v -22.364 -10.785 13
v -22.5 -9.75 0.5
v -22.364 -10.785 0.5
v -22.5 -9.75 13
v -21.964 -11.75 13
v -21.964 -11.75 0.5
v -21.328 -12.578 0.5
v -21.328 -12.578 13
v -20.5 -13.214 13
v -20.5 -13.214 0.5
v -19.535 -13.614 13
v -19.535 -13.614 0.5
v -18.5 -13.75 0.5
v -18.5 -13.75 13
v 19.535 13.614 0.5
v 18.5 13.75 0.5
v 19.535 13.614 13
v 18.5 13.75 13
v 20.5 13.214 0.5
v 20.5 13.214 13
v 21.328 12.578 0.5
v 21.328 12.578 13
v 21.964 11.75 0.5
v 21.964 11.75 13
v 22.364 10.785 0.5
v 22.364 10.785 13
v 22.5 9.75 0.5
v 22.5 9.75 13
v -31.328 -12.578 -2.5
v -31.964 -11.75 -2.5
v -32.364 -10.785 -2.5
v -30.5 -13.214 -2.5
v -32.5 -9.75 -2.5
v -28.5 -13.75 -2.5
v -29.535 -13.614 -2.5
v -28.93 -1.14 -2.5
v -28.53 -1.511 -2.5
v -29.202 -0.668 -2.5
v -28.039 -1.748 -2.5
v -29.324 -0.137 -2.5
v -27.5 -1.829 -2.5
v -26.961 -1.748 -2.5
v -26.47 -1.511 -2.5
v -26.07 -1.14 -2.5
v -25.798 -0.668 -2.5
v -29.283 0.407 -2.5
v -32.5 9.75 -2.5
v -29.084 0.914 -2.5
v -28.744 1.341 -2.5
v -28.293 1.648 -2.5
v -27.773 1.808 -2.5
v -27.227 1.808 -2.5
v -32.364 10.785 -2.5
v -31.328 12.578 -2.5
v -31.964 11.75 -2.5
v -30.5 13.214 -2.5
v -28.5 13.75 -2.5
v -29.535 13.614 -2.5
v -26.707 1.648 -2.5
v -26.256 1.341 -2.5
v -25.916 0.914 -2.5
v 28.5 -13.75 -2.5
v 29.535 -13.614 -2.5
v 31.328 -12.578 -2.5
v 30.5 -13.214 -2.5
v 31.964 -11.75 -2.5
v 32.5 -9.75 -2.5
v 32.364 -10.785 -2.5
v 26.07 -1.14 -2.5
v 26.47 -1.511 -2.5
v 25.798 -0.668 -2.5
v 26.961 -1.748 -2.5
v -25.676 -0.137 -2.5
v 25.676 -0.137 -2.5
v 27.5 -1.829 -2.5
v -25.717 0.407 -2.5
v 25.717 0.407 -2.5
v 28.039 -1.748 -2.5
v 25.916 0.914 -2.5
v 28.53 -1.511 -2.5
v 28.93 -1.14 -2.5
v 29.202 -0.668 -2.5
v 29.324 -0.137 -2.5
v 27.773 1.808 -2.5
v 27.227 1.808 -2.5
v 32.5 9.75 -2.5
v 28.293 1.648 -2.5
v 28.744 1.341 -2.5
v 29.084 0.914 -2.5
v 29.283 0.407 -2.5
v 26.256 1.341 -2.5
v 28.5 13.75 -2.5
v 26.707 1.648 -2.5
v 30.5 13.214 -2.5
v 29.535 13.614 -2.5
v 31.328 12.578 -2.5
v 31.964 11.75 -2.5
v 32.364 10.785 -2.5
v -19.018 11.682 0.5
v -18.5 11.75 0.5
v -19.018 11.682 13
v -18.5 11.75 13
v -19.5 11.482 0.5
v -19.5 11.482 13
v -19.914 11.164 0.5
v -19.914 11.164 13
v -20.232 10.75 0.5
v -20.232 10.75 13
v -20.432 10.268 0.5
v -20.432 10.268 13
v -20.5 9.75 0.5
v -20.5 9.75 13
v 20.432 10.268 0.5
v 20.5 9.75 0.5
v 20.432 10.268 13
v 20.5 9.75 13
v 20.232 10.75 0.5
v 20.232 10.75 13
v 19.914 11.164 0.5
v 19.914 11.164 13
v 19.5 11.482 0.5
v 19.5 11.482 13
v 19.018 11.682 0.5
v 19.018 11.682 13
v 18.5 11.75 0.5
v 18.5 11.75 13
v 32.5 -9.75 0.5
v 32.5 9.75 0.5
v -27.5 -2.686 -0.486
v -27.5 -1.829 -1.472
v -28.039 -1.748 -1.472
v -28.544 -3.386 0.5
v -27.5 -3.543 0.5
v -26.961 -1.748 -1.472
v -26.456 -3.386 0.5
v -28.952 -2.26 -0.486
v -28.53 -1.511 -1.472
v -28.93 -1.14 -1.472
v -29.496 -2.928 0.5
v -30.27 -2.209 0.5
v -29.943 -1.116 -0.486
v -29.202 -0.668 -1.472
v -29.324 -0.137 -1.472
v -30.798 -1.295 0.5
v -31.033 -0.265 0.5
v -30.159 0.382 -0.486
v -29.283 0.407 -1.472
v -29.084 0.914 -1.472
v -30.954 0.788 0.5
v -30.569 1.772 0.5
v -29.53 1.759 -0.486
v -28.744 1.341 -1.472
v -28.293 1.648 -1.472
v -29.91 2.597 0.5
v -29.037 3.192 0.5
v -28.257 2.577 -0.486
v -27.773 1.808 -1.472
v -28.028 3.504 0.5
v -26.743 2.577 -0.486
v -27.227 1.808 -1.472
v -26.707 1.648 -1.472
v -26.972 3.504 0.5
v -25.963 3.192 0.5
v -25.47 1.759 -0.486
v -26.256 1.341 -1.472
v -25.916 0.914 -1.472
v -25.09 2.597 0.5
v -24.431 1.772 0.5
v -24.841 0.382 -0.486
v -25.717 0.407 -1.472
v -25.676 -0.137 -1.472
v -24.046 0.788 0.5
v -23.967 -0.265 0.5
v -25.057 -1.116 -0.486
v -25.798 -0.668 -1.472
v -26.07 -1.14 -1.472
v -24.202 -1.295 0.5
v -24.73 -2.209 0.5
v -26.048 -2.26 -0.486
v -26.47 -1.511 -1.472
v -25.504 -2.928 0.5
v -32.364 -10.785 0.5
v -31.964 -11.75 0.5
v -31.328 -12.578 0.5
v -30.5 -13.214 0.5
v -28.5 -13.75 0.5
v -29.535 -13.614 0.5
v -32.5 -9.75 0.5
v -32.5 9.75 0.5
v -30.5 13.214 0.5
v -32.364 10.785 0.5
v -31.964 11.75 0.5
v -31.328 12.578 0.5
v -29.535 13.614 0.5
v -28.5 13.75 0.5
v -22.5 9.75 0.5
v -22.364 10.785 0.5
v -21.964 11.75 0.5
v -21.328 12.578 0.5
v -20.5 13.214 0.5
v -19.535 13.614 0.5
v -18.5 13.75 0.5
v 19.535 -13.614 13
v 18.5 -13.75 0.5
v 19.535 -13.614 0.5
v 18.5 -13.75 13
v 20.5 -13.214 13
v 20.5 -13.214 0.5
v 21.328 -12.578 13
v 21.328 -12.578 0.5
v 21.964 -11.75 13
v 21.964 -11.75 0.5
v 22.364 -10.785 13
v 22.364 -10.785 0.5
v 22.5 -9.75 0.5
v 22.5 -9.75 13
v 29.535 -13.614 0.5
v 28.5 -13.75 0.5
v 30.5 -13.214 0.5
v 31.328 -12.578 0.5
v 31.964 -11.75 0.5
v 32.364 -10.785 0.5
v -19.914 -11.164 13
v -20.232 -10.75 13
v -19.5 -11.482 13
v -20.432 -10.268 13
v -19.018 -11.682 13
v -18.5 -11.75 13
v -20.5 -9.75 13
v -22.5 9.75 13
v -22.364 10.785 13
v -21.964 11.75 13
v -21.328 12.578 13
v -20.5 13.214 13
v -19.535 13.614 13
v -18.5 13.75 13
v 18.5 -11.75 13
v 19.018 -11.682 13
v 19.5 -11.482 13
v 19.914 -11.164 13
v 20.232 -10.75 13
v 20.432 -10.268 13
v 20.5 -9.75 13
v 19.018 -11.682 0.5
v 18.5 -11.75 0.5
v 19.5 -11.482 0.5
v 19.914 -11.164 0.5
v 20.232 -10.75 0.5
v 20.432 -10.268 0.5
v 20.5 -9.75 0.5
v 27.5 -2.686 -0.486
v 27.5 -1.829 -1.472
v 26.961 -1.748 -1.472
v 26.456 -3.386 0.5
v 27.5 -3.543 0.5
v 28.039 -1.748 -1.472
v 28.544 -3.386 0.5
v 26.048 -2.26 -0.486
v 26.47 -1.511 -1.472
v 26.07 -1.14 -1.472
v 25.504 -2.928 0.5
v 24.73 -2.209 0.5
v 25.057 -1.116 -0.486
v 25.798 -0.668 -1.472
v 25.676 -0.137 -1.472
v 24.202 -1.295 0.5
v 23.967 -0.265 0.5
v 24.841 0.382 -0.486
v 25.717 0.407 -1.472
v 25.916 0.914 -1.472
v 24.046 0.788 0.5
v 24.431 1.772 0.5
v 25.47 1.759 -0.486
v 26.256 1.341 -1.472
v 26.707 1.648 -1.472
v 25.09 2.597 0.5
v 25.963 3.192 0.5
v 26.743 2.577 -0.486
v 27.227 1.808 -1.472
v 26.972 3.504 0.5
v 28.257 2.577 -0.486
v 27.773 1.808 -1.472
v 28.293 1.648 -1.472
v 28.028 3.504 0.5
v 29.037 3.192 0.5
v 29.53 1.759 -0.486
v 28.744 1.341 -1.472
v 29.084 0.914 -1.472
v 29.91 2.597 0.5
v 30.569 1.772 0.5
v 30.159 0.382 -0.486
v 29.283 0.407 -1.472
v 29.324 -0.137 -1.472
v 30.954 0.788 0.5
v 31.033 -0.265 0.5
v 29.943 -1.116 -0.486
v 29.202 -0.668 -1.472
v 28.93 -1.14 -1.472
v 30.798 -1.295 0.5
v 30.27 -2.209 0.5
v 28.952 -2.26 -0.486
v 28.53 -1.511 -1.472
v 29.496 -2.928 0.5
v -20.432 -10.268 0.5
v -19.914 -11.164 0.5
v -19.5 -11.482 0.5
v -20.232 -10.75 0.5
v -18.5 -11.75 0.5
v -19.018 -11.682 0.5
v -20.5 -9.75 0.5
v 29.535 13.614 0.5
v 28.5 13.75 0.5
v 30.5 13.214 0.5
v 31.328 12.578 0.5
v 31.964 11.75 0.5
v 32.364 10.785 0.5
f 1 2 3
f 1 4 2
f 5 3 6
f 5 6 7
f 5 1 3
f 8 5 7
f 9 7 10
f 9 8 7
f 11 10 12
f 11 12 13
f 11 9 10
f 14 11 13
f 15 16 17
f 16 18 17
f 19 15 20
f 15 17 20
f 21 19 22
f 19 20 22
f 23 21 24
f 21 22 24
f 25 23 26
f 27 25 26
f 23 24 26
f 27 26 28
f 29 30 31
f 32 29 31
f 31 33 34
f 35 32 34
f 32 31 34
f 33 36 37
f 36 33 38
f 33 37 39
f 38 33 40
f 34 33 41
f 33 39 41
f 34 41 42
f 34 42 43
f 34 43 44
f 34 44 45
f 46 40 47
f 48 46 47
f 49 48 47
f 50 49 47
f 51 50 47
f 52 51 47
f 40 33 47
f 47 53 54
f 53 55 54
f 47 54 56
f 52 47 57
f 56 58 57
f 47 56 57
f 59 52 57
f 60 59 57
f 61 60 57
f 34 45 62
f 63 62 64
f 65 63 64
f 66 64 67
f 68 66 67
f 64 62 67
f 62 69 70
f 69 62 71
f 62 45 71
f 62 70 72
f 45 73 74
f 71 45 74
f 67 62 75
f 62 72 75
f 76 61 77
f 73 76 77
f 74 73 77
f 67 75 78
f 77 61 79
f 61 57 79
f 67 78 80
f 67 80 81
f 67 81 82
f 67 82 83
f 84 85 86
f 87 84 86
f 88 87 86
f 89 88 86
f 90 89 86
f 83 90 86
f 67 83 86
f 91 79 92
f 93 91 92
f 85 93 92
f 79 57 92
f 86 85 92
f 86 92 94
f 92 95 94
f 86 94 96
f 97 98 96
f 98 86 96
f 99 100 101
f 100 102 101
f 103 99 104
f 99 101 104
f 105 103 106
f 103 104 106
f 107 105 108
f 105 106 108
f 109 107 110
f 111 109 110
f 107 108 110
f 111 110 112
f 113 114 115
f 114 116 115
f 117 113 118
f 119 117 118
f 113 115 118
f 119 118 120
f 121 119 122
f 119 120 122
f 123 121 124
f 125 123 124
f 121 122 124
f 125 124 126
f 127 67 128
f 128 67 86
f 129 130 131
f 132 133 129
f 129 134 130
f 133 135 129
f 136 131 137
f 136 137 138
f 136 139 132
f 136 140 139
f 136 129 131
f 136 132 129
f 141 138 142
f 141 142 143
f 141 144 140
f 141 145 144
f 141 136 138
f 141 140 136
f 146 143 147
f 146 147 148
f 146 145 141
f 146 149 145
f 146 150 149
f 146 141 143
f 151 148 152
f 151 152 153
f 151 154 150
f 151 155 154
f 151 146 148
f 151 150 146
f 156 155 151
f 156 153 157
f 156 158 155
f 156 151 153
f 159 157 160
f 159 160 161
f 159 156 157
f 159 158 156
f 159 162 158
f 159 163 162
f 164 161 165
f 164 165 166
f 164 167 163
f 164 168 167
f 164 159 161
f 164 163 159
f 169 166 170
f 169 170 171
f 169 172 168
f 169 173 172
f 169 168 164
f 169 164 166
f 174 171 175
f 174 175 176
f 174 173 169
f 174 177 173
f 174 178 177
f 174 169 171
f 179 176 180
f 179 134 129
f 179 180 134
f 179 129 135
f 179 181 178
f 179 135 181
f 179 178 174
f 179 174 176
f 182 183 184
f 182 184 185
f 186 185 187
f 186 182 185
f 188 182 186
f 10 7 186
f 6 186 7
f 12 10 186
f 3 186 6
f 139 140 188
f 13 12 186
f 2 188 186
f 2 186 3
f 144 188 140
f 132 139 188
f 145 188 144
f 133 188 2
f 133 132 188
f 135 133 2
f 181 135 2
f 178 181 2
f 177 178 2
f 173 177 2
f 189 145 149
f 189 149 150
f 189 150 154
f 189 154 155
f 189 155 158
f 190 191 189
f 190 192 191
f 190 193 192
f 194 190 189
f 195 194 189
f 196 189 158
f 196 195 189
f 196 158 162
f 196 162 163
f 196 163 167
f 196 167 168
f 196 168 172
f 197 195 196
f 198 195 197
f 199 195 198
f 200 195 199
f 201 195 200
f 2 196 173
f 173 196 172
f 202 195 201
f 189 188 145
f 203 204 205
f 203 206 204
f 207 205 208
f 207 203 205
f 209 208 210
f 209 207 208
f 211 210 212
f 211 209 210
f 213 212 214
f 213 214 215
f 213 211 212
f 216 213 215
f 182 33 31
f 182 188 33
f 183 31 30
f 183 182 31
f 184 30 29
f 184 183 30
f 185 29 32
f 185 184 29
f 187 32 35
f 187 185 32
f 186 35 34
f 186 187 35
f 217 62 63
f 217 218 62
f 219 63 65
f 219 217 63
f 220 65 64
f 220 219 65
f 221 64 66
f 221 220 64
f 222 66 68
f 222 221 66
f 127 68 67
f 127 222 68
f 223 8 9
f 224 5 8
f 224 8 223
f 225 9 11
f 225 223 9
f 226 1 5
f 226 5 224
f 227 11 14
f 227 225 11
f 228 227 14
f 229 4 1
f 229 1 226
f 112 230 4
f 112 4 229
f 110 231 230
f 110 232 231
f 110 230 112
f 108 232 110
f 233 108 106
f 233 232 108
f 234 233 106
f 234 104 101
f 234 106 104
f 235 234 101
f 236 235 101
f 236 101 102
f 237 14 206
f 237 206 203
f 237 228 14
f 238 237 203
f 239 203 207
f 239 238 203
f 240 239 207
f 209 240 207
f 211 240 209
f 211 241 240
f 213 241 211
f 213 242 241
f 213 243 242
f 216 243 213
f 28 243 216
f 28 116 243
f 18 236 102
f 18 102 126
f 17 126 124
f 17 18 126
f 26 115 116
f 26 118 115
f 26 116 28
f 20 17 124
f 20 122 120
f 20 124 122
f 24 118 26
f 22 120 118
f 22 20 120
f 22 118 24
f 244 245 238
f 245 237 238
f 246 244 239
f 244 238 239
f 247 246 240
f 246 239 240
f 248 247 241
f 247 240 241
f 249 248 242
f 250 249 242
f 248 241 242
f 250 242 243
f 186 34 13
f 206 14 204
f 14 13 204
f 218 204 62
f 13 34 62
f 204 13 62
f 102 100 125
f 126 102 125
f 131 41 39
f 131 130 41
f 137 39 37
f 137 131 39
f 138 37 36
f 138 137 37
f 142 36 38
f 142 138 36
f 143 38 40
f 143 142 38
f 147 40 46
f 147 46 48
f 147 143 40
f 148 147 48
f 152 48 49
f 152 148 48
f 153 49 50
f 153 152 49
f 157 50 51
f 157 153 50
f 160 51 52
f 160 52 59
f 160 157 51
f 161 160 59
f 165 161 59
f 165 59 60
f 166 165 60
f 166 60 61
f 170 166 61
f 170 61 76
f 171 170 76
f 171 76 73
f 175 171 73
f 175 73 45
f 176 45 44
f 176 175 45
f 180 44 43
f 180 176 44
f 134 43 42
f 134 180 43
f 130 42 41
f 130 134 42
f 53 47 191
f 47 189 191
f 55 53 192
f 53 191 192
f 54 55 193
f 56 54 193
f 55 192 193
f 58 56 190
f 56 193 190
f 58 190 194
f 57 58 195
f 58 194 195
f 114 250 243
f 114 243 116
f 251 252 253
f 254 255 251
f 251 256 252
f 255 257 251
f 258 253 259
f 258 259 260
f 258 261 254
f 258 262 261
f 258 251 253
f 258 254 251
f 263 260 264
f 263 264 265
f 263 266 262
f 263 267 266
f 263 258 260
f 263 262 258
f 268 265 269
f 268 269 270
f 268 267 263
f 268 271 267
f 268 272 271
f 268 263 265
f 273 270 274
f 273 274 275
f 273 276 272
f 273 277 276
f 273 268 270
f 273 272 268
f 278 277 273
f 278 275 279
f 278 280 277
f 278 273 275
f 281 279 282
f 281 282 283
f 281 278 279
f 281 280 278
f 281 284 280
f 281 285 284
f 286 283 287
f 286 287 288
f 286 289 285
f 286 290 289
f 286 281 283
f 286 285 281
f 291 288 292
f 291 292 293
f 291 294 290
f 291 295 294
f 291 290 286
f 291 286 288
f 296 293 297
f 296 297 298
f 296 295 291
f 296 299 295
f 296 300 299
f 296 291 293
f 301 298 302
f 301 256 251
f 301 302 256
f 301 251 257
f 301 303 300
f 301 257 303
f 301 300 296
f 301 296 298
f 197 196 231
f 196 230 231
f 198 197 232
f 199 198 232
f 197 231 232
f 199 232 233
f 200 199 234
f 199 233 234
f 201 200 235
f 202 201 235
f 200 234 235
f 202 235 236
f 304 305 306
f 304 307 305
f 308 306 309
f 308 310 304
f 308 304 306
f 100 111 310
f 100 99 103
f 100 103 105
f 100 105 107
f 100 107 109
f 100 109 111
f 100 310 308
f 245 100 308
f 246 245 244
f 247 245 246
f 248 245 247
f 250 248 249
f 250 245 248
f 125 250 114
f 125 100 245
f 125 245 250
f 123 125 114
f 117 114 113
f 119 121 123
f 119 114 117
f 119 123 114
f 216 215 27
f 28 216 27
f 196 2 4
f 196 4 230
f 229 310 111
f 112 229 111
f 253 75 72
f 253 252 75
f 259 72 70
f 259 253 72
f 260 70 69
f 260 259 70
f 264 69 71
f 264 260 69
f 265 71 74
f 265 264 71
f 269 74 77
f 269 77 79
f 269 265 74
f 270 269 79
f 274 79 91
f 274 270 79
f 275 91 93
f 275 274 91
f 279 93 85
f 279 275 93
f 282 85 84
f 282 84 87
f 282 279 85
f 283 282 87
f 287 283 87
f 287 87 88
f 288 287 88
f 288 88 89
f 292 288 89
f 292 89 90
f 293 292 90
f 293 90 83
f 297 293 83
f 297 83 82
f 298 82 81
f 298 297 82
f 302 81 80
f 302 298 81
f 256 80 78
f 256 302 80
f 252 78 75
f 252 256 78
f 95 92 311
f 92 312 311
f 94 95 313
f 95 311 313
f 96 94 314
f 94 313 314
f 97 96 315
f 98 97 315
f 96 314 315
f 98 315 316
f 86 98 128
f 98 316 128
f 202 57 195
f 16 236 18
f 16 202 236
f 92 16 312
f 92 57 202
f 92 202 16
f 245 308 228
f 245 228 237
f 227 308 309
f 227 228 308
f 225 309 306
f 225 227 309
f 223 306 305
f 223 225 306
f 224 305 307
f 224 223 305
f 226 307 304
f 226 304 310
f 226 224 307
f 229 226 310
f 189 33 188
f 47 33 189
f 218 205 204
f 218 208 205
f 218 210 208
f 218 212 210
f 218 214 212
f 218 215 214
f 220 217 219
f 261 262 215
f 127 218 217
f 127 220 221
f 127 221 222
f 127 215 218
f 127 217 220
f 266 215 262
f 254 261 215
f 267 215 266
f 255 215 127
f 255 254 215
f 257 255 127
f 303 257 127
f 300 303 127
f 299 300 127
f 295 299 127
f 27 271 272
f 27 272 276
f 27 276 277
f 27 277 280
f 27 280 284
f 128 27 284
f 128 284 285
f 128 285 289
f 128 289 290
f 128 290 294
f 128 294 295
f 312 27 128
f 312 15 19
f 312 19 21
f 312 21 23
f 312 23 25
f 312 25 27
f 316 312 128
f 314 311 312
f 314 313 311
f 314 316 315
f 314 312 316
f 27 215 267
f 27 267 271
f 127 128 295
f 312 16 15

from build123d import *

# Parameters (mm, degrees)
WALLS_SKETCH_W                 = 45
WALLS_SKETCH_H                 = 27.5
WALLS_SKETCH_W_2               = 41
WALLS_SKETCH_H_2               = 23.5
WALLS_EXTRUDE_DEPTH            = 15.5
BASE_SKETCH_W                  = 65
BASE_SKETCH_H                  = 27.5
BASE_EXTRUDE_DEPTH             = 3
NO_6_MOUNTING_HOLES_AT_2_COUNT = 2
NO_6_MOUNTING_HOLES_AT_2_PITCH = 55
TAB_FILLETS_R                  = 4
INSIDE_CORNER_FILLETS_R        = 2
OUTSIDE_CORNER_FILLETS_R       = 4


with BuildPart() as part:
    # Walls Sketch → Walls Extrude (new body)
    with BuildSketch(Plane.XY.offset(-2.5)):
        Rectangle(WALLS_SKETCH_W, WALLS_SKETCH_H)
        Rectangle(WALLS_SKETCH_W_2, WALLS_SKETCH_H_2, mode=Mode.SUBTRACT)
    extrude(amount=WALLS_EXTRUDE_DEPTH)

    # Base Sketch → Base Extrude (add)
    with BuildSketch(Plane.XY.offset(-2.5)):
        Rectangle(BASE_SKETCH_W, BASE_SKETCH_H)
    extrude(amount=BASE_EXTRUDE_DEPTH)

    # No. 6 Mounting Holes Profile Sketch → No. 6 Mounting Holes (revolve, cut)
    with BuildSketch(Plane(origin=(-27.5, 0, 0.5), x_dir=(0, -1, 0), z_dir=(1, 0, 0))):
        Polygon((0, 0), (0, 3), (1.8288, 3), (1.8288, 1.972306634), (3.5433, 0), align=None)
    no_6_mounting_holes = revolve(axis=Axis((-27.5, 0, 6.85), (0, 0, -1)), mode=Mode.SUBTRACT)

    # No. 6 Mounting Holes at 2: No. 6 Mounting Holes ×2
    with Locations(*[(i * NO_6_MOUNTING_HOLES_AT_2_PITCH, 0, 0) for i in range(1, NO_6_MOUNTING_HOLES_AT_2_COUNT)]):
        add(no_6_mounting_holes, mode=Mode.SUBTRACT)

    # Tab Fillets
    tab_fillets_edges = [part.edges().sort_by_distance(p)[0] for p in [
        (-32.5, -13.75, -1),
        (32.5, 13.75, -1),
        (-32.5, 13.75, -1),
        (32.5, -13.75, -1),
    ]]
    fillet(tab_fillets_edges, radius=TAB_FILLETS_R)

    # Inside Corner Fillets
    inside_corner_fillets_edges = [part.edges().sort_by_distance(p)[0] for p in [
        (-20.5, -11.75, 6.75),
        (20.5, -11.75, 6.75),
        (-20.5, 11.75, 6.75),
        (20.5, 11.75, 6.75),
    ]]
    fillet(inside_corner_fillets_edges, radius=INSIDE_CORNER_FILLETS_R)

    # Outside Corner Fillets
    outside_corner_fillets_edges = [part.edges().sort_by_distance(p)[0] for p in [
        (22.5, -13.75, 6.75),
        (-22.5, -13.75, 6.75),
        (-22.5, 13.75, 6.75),
        (22.5, 13.75, 6.75),
    ]]
    fillet(outside_corner_fillets_edges, radius=OUTSIDE_CORNER_FILLETS_R)


solid = part.part
